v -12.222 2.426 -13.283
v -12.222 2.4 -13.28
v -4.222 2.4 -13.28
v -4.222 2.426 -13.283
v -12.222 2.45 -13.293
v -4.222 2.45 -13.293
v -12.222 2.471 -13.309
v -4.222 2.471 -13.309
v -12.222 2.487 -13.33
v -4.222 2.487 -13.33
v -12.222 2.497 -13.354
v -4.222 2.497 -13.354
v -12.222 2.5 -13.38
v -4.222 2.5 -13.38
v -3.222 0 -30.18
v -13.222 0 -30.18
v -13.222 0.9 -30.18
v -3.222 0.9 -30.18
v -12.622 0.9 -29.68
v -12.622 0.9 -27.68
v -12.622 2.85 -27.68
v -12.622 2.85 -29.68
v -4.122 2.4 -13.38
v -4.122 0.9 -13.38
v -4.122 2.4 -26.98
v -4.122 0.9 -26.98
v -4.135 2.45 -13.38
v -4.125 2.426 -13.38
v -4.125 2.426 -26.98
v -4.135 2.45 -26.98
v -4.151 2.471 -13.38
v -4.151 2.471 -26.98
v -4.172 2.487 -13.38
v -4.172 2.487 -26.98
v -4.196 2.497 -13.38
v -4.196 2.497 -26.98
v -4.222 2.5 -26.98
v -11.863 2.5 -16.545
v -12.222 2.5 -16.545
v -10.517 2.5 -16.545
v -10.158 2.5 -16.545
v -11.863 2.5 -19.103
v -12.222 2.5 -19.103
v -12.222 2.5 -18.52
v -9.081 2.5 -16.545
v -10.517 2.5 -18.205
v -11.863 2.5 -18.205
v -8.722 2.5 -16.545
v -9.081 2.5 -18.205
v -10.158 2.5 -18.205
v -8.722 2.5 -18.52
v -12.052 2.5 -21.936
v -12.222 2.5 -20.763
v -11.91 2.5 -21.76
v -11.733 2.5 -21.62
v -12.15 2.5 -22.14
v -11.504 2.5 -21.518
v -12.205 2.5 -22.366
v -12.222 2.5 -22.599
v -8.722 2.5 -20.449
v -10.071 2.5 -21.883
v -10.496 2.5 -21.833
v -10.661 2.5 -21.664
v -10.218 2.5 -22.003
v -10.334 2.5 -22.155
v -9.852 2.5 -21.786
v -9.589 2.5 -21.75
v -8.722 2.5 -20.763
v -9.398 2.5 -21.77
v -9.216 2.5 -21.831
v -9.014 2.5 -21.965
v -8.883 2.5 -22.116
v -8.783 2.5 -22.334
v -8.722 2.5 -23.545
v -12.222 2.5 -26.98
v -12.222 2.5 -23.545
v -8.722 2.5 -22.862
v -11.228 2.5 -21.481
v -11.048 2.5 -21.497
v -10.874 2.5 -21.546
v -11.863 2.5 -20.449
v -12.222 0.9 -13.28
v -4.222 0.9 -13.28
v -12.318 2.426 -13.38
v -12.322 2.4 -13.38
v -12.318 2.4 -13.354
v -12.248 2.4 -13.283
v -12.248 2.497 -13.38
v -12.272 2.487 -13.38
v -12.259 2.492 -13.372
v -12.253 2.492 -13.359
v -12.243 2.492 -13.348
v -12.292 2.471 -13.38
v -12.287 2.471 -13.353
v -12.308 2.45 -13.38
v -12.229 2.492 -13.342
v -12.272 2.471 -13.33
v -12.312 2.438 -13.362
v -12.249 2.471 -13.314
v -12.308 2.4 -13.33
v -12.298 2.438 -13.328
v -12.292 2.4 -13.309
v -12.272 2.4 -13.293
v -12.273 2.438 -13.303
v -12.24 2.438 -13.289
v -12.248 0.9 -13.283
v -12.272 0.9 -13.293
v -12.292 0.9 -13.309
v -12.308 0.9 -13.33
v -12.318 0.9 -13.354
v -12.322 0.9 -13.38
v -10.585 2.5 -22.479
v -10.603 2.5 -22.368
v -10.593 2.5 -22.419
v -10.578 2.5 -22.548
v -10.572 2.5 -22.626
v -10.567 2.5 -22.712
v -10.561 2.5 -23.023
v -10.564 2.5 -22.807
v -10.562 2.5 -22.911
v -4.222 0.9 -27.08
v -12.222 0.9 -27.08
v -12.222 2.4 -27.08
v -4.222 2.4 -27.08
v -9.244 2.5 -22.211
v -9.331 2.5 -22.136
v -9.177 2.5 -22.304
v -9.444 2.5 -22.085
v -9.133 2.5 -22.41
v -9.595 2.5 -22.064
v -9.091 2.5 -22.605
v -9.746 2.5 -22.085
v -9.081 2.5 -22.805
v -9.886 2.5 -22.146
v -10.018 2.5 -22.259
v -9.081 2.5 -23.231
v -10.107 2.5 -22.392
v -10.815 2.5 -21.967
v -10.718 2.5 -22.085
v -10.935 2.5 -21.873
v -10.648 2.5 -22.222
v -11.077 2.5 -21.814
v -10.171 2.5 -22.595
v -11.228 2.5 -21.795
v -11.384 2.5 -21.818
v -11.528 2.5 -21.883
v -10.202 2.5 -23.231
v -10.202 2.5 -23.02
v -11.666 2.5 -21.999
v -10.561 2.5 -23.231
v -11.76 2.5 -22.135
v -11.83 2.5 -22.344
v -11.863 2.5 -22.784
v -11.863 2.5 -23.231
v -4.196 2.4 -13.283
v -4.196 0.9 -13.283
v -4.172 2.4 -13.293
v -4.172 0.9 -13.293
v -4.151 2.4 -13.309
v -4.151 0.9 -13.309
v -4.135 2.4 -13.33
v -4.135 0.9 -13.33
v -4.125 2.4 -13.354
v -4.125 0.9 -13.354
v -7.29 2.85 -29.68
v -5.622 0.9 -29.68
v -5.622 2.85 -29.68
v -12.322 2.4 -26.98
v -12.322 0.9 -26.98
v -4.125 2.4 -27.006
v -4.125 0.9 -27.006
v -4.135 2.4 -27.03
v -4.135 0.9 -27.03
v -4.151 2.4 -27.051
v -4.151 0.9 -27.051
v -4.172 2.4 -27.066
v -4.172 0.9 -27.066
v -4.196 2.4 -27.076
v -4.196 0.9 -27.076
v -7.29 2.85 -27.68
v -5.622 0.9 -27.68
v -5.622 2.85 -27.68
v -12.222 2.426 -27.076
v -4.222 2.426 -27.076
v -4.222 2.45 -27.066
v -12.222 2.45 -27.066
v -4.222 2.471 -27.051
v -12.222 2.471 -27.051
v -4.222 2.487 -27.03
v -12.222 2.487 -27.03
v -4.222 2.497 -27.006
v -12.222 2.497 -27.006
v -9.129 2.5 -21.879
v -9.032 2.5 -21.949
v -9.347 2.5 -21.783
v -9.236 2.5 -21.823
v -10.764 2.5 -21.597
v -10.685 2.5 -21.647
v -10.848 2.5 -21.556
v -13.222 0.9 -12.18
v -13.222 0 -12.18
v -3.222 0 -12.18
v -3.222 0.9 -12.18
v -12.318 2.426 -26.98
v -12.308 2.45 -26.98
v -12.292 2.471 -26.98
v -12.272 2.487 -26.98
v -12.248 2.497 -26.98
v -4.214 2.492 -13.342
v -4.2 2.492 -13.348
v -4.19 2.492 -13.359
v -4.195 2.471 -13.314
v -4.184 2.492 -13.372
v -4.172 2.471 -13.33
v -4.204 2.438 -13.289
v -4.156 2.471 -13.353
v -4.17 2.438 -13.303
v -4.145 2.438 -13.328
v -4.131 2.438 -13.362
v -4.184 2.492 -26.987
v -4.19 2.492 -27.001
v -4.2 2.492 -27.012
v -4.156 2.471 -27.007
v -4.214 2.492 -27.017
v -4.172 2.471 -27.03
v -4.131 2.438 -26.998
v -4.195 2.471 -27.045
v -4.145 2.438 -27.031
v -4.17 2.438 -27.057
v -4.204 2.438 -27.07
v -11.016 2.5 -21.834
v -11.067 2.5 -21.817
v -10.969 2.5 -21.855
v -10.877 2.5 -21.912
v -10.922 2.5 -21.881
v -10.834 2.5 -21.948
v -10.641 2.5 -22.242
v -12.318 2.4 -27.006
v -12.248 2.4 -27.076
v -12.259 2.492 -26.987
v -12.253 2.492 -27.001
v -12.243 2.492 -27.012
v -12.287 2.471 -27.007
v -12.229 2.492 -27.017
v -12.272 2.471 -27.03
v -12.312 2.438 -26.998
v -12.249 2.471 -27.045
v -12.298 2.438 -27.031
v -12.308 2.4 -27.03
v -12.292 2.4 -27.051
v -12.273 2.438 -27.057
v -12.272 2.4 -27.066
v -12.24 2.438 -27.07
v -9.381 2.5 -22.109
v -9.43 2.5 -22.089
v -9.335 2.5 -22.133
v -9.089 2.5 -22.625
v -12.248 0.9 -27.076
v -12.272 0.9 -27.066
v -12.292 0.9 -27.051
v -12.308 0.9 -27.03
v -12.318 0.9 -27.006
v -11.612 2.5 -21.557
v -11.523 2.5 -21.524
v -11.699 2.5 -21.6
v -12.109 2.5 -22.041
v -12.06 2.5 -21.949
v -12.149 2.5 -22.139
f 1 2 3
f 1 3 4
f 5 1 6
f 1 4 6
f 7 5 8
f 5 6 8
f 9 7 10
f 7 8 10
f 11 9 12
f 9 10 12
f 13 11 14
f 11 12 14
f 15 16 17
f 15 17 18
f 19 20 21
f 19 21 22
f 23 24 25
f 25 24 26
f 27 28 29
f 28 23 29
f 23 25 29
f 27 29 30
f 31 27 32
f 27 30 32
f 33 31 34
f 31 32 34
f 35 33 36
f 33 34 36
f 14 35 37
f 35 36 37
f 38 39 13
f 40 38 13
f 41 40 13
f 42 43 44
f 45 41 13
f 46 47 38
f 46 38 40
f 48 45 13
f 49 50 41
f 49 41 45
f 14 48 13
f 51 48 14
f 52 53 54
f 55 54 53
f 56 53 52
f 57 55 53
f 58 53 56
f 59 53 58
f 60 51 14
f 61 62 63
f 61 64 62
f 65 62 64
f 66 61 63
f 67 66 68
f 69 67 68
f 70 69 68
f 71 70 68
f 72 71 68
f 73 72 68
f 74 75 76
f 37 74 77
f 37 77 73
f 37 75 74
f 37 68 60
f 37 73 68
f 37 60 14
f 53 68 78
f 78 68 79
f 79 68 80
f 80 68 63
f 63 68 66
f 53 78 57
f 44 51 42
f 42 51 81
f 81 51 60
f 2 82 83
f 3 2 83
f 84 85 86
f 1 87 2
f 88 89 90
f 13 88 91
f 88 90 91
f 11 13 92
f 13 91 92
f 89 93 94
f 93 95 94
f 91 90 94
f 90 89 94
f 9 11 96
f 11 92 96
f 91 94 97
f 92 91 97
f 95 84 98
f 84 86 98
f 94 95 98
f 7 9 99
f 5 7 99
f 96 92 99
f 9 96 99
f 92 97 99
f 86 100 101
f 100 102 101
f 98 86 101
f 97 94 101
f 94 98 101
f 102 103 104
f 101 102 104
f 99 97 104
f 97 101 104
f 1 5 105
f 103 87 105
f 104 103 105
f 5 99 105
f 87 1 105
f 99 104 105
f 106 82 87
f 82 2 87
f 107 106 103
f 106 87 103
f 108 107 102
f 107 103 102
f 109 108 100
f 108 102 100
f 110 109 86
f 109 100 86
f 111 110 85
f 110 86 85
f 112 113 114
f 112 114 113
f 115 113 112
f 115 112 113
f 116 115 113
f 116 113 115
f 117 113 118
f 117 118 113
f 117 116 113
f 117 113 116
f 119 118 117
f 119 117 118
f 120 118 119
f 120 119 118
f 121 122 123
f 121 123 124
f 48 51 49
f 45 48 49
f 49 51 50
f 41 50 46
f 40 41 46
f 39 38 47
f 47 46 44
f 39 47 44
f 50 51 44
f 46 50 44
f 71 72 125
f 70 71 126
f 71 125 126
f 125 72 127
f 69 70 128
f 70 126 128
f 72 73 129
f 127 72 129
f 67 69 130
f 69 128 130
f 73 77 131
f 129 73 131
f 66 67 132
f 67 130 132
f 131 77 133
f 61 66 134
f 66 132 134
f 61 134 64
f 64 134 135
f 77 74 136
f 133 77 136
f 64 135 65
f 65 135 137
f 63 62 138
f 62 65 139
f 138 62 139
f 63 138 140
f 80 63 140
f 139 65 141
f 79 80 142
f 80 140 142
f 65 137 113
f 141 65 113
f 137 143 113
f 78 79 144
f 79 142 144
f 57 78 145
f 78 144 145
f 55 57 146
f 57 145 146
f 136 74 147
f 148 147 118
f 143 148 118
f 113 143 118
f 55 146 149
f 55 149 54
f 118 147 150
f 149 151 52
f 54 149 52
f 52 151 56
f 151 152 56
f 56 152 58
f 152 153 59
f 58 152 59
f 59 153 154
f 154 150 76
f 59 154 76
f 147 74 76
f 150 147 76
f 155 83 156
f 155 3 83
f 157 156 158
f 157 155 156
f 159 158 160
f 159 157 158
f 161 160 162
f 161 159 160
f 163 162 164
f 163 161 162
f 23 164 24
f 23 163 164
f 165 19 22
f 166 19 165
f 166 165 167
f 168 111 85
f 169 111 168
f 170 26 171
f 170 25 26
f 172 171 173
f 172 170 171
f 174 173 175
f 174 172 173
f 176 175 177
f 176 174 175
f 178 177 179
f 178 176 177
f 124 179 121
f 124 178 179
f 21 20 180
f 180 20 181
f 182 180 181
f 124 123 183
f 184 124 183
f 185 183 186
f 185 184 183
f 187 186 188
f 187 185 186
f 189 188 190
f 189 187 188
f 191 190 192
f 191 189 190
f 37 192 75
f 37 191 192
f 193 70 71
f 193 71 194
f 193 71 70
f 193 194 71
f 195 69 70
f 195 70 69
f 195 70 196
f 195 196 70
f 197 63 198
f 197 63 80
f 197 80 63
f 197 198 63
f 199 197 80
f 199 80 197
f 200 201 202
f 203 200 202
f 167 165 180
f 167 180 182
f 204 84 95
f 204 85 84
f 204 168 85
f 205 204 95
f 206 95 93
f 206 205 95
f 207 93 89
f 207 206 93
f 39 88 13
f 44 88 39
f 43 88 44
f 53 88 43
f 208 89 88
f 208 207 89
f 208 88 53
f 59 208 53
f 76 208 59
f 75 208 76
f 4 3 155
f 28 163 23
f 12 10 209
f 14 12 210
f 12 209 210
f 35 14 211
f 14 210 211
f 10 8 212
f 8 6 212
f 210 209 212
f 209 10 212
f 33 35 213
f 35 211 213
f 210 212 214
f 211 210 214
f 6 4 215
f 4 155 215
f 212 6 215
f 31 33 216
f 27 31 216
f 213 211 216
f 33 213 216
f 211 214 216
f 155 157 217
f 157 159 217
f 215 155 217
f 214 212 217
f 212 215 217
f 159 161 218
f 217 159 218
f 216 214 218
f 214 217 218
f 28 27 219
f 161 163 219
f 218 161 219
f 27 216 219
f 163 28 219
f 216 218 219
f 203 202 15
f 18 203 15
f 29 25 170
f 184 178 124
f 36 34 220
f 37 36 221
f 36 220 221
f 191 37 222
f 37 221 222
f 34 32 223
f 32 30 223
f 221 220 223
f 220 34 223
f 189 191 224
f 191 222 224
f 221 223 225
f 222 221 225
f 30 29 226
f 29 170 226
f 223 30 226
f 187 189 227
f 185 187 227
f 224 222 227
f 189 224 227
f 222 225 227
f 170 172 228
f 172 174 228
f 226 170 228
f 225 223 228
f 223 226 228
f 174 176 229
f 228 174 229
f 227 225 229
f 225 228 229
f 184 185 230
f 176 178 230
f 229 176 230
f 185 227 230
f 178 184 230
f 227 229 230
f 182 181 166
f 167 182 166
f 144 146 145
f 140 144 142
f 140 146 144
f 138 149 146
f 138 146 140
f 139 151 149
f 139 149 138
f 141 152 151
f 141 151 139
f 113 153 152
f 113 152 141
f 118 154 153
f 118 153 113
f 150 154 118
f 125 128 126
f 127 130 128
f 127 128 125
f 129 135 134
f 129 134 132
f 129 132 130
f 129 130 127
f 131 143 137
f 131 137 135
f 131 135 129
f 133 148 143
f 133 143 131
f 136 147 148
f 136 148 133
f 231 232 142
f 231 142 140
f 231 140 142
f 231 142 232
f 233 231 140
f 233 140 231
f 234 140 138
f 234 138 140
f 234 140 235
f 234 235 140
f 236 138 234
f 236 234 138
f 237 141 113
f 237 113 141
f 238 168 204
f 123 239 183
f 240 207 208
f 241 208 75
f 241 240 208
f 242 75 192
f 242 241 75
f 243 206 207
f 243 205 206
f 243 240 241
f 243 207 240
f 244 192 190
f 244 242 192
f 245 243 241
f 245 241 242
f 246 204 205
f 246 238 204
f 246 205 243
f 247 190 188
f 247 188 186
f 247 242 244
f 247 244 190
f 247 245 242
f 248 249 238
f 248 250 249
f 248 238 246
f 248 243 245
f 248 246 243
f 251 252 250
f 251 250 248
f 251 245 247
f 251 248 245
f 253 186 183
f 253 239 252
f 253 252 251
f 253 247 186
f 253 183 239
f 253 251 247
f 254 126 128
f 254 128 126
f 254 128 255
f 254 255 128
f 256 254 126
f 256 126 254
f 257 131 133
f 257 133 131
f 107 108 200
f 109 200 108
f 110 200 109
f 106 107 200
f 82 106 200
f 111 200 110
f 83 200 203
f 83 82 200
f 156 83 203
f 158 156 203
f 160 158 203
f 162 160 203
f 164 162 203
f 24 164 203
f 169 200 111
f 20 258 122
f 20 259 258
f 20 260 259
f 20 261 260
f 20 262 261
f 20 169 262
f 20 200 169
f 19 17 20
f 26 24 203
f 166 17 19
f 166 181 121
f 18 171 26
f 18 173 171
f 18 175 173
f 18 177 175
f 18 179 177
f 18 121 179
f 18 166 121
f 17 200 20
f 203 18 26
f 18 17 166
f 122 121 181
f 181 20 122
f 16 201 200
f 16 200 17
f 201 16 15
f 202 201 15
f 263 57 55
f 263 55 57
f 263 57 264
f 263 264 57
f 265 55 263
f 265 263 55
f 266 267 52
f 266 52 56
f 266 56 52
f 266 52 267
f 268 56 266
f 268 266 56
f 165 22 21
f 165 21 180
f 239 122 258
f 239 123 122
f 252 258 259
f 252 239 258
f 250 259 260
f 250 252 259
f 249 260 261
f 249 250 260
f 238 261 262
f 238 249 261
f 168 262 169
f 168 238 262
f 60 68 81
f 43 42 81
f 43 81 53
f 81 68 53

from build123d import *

# Parameters (mm, degrees)
SCHIZZO1_W                   = 10
SCHIZZO1_H                   = 18
ESTRUSIONE_ESTRUSIONE1_DEPTH = 0.9
SCHIZZO2_W                   = 8.2
SCHIZZO2_H                   = 13.8
ESTRUSIONE_ESTRUSIONE2_DEPTH = 1.6
RACCORDO1_R                  = 0.1
SCHIZZO3_W                   = 7
SCHIZZO3_H                   = 2
ESTRUSIONE_ESTRUSIONE3_DEPTH = 1.95
SCHIZZO4_W                   = 1.668109591
SCHIZZO4_H                   = 2
ESTRUSIONE_ESTRUSIONE4_DEPTH = 0.0001
TAGLIO_ESTRUSIONE1_DEPTH     = 0.0001


with BuildPart() as part:
    # Schizzo1 → Estrusione-Estrusione1 (new body)
    with BuildSketch(Plane(origin=(0, 0, 0), x_dir=(1, 0, 0), z_dir=(0, 1, 0))):
        with Locations((-8.221633561, 21.179815737)):
            Rectangle(SCHIZZO1_W, SCHIZZO1_H)
    extrude(amount=ESTRUSIONE_ESTRUSIONE1_DEPTH)

    # Schizzo2 → Estrusione-Estrusione2 (add)
    with BuildSketch(Plane(origin=(0, 0.9, 0), x_dir=(1, 0, 0), z_dir=(0, 1, 0))):
        with Locations((-8.221633561, 20.179815737)):
            Rectangle(SCHIZZO2_W, SCHIZZO2_H)
    extrude(amount=ESTRUSIONE_ESTRUSIONE2_DEPTH)

    # Raccordo1
    raccordo1_edges = [part.edges().sort_by_distance(p)[0] for p in [
        (-12.321633561, 1.7, -27.079815737),
        (-12.321633561, 1.7, -13.279815737),
        (-4.121633561, 1.7, -13.279815737),
        (-4.121633561, 1.7, -27.079815737),
        (-12.321633561, 2.5, -20.179815737),
        (-8.221633561, 2.5, -13.279815737),
        (-4.121633561, 2.5, -20.179815737),
        (-8.221633561, 2.5, -27.079815737),
    ]]
    fillet(raccordo1_edges, radius=RACCORDO1_R)

    # Schizzo3 → Estrusione-Estrusione3 (add)
    with BuildSketch(Plane(origin=(0, 0.9, 0), x_dir=(1, 0, 0), z_dir=(0, 1, 0))):
        with Locations((-9.121633561, 28.679815737)):
            Rectangle(SCHIZZO3_W, SCHIZZO3_H)
    extrude(amount=ESTRUSIONE_ESTRUSIONE3_DEPTH)

    # Schizzo4 → Estrusione-Estrusione4 (add)
    with BuildSketch(Plane(origin=(0, 2.85, 0), x_dir=(1, 0, 0), z_dir=(0, 1, 0))):
        with Locations((-6.455688357, 28.679815737)):
            Rectangle(SCHIZZO4_W, SCHIZZO4_H)
    extrude(amount=ESTRUSIONE_ESTRUSIONE4_DEPTH)

    # Schizzo6 → Taglio-Estrusione1 (cut)
    # profile 1 of 3: a face of its own
    with BuildSketch(Plane(origin=(0, 2.5, 0), x_dir=(1, 0, 0), z_dir=(0, 1, 0))):
        with BuildLine():
            Line((-8.721633561, 23.545200352), (-8.721633561, 22.862307724))
            add(Edge.make_bspline(
                [(-8.721633561, 22.862307724), (-8.721809311, 22.828879246), (-8.722149959, 22.764086535), (-8.72743309, 22.669867093), (-8.73463676, 22.581618283), (-8.746066853, 22.49931451), (-8.75985863, 22.422993808), (-8.776560446, 22.352426171), (-8.79658706, 22.287835998), (-8.828433341, 22.210723262), (-8.875756509, 22.122802601), (-8.945685074, 22.027604208), (-9.031217538, 21.946199969), (-9.127700193, 21.876013652), (-9.233835965, 21.820212532), (-9.347095154, 21.779843235), (-9.466016895, 21.75428536), (-9.547660073, 21.751656925), (-9.588921221, 21.750328557)],
                knots=[0, 0, 0, 0, 1.001505555, 1.941167018, 2.826882275, 3.653841531, 4.429895133, 5.150066043, 5.825578002, 6.45369114, 7.647487171, 8.808567382, 9.977351308, 11.170798116, 12.373658725, 13.556498008, 14.765093433, 16, 16, 16, 16], degree=3))
            add(Edge.make_bspline(
                [(-9.588921221, 21.750328557), (-9.627580326, 21.751400647), (-9.703549112, 21.753507404), (-9.814482881, 21.774339057), (-9.920517432, 21.805354415), (-10.020345579, 21.850379552), (-10.112684314, 21.908295812), (-10.196984871, 21.977991345), (-10.271204297, 22.060972988), (-10.31252402, 22.12324465), (-10.333512567, 22.154875833)],
                knots=[0, 0, 0, 0, 1.044266239, 2.052081639, 3.041743201, 4.026043445, 5.00270663, 5.980942822, 6.97441044, 8, 8, 8, 8], degree=3))
            add(Edge.make_bspline(
                [(-10.333512567, 22.154875833), (-10.348765786, 22.115108746), (-10.377948973, 22.039024459), (-10.429825242, 21.934247144), (-10.485612511, 21.843612441), (-10.546857455, 21.767020589), (-10.613698528, 21.702503806), (-10.684797277, 21.644566395), (-10.763653991, 21.596027836), (-10.848023281, 21.554329121), (-10.937313, 21.52151267), (-11.031114793, 21.498292878), (-11.128379786, 21.484025445), (-11.194675763, 21.482079939), (-11.228143977, 21.481097788)],
                knots=[0, 0, 0, 0, 1.272302504, 2.434229863, 3.488457646, 4.447234501, 5.35599188, 6.26022912, 7.18267843, 8.11661068, 9.06895546, 10.019249207, 11.000057067, 12, 12, 12, 12], degree=3))
            add(Edge.make_bspline(
                [(-11.228143977, 21.481097788), (-11.262310656, 21.48207494), (-11.329534553, 21.483997516), (-11.428292454, 21.498173108), (-11.522657231, 21.522198308), (-11.613299831, 21.555210245), (-11.699707184, 21.598539779), (-11.78296147, 21.650133961), (-11.860844851, 21.712930621), (-11.93520948, 21.782926386), (-12.002032852, 21.862204121), (-12.061524209, 21.947726181), (-12.110674198, 22.040722655), (-12.151445315, 22.139751415), (-12.183042722, 22.245470508), (-12.204979107, 22.357487955), (-12.219794287, 22.475828098), (-12.221010067, 22.557038433), (-12.221633561, 22.598685929)],
                knots=[0, 0, 0, 0, 0.978404568, 1.925038397, 2.85041836, 3.763147166, 4.682162379, 5.614488577, 6.562659439, 7.54271123, 8.535210642, 9.526693784, 10.520907202, 11.541451354, 12.589717429, 13.675358278, 14.807842563, 16, 16, 16, 16], degree=3))
            Line((-12.221633561, 22.598685929), (-12.221633561, 23.545200352))
            Line((-12.221633561, 23.545200352), (-8.721633561, 23.545200352))
        make_face()
        with BuildLine():
            Line((-9.08060792, 23.231097788), (-10.202402792, 23.231097788))
            Line((-10.202402792, 23.231097788), (-10.202402792, 23.020060128))
            add(Edge.make_bspline(
                [(-10.202402792, 23.020060128), (-10.202006197, 22.989211054), (-10.201239894, 22.929604358), (-10.198975616, 22.843055067), (-10.192913178, 22.762917749), (-10.18650115, 22.688916263), (-10.176627939, 22.621546602), (-10.164545903, 22.560583229), (-10.151879752, 22.505478502), (-10.130278548, 22.441959534), (-10.098677918, 22.369929866), (-10.048483138, 22.293631553), (-9.990321552, 22.225276288), (-9.921972987, 22.168200505), (-9.847351496, 22.121103006), (-9.766450427, 22.08967218), (-9.68242813, 22.067378707), (-9.624594659, 22.065423715), (-9.595231317, 22.064431121)],
                knots=[0, 0, 0, 0, 1.156481963, 2.23455883, 3.244418989, 4.168404366, 5.01828131, 5.794834307, 6.498111525, 7.13526334, 8.307595709, 9.435046769, 10.546766856, 11.659452936, 12.760769924, 13.837671619, 14.902137667, 16, 16, 16, 16], degree=3))
            add(Edge.make_bspline(
                [(-9.595231317, 22.064431121), (-9.575796396, 22.064927559), (-9.537672677, 22.065901376), (-9.482311145, 22.074764266), (-9.429577332, 22.087624406), (-9.38068408, 22.107715868), (-9.334241704, 22.132010599), (-9.292313019, 22.163613634), (-9.252600923, 22.199304177), (-9.216563546, 22.241219245), (-9.184273914, 22.289155884), (-9.155861871, 22.343570841), (-9.133449638, 22.405113859), (-9.113344673, 22.47238952), (-9.099394018, 22.546474511), (-9.087729412, 22.626644921), (-9.08179997, 22.713580859), (-9.081014133, 22.773725786), (-9.08060792, 22.804815737)],
                knots=[0, 0, 0, 0, 0.911752476, 1.788502045, 2.626783689, 3.45400582, 4.26402138, 5.080402872, 5.911472738, 6.767166405, 7.66795952, 8.620018292, 9.640966946, 10.73819047, 11.913090943, 13.176185384, 14.540321519, 16, 16, 16, 16], degree=3))
            Line((-9.08060792, 22.804815737), (-9.08060792, 23.231097788))
        make_face(mode=Mode.SUBTRACT)
        with BuildLine():
            Line((-10.561377151, 23.231097788), (-11.862659202, 23.231097788))
            Line((-11.862659202, 23.231097788), (-11.862659202, 22.783782083))
            add(Edge.make_bspline(
                [(-11.862659202, 22.783782083), (-11.862276795, 22.751762998), (-11.861539755, 22.690050433), (-11.859107362, 22.600951316), (-11.853690782, 22.518592948), (-11.844860313, 22.442927938), (-11.835684686, 22.373290226), (-11.822985174, 22.310371666), (-11.808547365, 22.254075798), (-11.786204171, 22.188807607), (-11.751552873, 22.115264242), (-11.698965819, 22.036065441), (-11.637141399, 21.964948169), (-11.564685457, 21.905248782), (-11.486498476, 21.855951368), (-11.402989401, 21.821376216), (-11.316705845, 21.799144888), (-11.257724028, 21.796517844), (-11.228143977, 21.795200352)],
                knots=[0, 0, 0, 0, 1.159821618, 2.235403267, 3.228114831, 4.14795534, 4.994323282, 5.771256229, 6.471395042, 7.097801288, 8.267864287, 9.404187171, 10.531774336, 11.667624178, 12.792825787, 13.866573821, 14.930062559, 16, 16, 16, 16], degree=3))
            add(Edge.make_bspline(
                [(-11.228143977, 21.795200352), (-11.209648244, 21.795469643), (-11.172955116, 21.796003882), (-11.119074178, 21.804363823), (-11.066648588, 21.816026487), (-11.016471096, 21.832915026), (-10.967725208, 21.854210104), (-10.921260001, 21.880934621), (-10.875964474, 21.911796374), (-10.818766488, 21.960074353), (-10.752842263, 22.030229244), (-10.688307172, 22.129941735), (-10.636258684, 22.243312419), (-10.614159305, 22.325540142), (-10.602743336, 22.368016858)],
                knots=[0, 0, 0, 0, 0.723503378, 1.435336582, 2.130201219, 2.824764462, 3.504949994, 4.209866579, 4.920640069, 5.648298893, 7.13757748, 8.670694625, 10.280166878, 12, 12, 12, 12], degree=3))
            add(Edge.make_bspline(
                [(-10.602743336, 22.368016858), (-10.59928802, 22.385045938), (-10.591796182, 22.421968496), (-10.583892945, 22.482176382), (-10.576803483, 22.551142736), (-10.571697091, 22.628572782), (-10.566215467, 22.714774469), (-10.564159524, 22.809720106), (-10.561650137, 22.913476814), (-10.561470474, 22.985469274), (-10.561377151, 23.022864615)],
                knots=[0, 0, 0, 0, 0.634452549, 1.375623993, 2.216454381, 3.166361212, 4.209414599, 5.370755378, 6.634280627, 8, 8, 8, 8], degree=3))
            Line((-10.561377151, 23.022864615), (-10.561377151, 23.231097788))
        make_face(mode=Mode.SUBTRACT)
    # profile 2 of 3: a face of its own
    with BuildSketch(Plane(origin=(0, 2.5, 0), x_dir=(1, 0, 0), z_dir=(0, 1, 0))):
        Polygon((-8.721633561, 20.76314907), (-8.721633561, 20.449046506), (-11.862659202, 20.449046506), (-11.862659202, 19.10289266), (-12.221633561, 19.10289266), (-12.221633561, 20.76314907), align=None)
    # profile 3 of 3: a face of its own
    with BuildSketch(Plane(origin=(0, 2.5, 0), x_dir=(1, 0, 0), z_dir=(0, 1, 0))):
        Polygon((-8.721633561, 18.519559326), (-8.721633561, 16.545200352), (-9.08060792, 16.545200352), (-9.08060792, 18.205456762), (-10.157530997, 18.205456762), (-10.157530997, 16.545200352), (-10.516505356, 16.545200352), (-10.516505356, 18.205456762), (-11.862659202, 18.205456762), (-11.862659202, 16.545200352), (-12.221633561, 16.545200352), (-12.221633561, 18.519559326), align=None)
    extrude(amount=-TAGLIO_ESTRUSIONE1_DEPTH, mode=Mode.SUBTRACT)


solid = part.part
